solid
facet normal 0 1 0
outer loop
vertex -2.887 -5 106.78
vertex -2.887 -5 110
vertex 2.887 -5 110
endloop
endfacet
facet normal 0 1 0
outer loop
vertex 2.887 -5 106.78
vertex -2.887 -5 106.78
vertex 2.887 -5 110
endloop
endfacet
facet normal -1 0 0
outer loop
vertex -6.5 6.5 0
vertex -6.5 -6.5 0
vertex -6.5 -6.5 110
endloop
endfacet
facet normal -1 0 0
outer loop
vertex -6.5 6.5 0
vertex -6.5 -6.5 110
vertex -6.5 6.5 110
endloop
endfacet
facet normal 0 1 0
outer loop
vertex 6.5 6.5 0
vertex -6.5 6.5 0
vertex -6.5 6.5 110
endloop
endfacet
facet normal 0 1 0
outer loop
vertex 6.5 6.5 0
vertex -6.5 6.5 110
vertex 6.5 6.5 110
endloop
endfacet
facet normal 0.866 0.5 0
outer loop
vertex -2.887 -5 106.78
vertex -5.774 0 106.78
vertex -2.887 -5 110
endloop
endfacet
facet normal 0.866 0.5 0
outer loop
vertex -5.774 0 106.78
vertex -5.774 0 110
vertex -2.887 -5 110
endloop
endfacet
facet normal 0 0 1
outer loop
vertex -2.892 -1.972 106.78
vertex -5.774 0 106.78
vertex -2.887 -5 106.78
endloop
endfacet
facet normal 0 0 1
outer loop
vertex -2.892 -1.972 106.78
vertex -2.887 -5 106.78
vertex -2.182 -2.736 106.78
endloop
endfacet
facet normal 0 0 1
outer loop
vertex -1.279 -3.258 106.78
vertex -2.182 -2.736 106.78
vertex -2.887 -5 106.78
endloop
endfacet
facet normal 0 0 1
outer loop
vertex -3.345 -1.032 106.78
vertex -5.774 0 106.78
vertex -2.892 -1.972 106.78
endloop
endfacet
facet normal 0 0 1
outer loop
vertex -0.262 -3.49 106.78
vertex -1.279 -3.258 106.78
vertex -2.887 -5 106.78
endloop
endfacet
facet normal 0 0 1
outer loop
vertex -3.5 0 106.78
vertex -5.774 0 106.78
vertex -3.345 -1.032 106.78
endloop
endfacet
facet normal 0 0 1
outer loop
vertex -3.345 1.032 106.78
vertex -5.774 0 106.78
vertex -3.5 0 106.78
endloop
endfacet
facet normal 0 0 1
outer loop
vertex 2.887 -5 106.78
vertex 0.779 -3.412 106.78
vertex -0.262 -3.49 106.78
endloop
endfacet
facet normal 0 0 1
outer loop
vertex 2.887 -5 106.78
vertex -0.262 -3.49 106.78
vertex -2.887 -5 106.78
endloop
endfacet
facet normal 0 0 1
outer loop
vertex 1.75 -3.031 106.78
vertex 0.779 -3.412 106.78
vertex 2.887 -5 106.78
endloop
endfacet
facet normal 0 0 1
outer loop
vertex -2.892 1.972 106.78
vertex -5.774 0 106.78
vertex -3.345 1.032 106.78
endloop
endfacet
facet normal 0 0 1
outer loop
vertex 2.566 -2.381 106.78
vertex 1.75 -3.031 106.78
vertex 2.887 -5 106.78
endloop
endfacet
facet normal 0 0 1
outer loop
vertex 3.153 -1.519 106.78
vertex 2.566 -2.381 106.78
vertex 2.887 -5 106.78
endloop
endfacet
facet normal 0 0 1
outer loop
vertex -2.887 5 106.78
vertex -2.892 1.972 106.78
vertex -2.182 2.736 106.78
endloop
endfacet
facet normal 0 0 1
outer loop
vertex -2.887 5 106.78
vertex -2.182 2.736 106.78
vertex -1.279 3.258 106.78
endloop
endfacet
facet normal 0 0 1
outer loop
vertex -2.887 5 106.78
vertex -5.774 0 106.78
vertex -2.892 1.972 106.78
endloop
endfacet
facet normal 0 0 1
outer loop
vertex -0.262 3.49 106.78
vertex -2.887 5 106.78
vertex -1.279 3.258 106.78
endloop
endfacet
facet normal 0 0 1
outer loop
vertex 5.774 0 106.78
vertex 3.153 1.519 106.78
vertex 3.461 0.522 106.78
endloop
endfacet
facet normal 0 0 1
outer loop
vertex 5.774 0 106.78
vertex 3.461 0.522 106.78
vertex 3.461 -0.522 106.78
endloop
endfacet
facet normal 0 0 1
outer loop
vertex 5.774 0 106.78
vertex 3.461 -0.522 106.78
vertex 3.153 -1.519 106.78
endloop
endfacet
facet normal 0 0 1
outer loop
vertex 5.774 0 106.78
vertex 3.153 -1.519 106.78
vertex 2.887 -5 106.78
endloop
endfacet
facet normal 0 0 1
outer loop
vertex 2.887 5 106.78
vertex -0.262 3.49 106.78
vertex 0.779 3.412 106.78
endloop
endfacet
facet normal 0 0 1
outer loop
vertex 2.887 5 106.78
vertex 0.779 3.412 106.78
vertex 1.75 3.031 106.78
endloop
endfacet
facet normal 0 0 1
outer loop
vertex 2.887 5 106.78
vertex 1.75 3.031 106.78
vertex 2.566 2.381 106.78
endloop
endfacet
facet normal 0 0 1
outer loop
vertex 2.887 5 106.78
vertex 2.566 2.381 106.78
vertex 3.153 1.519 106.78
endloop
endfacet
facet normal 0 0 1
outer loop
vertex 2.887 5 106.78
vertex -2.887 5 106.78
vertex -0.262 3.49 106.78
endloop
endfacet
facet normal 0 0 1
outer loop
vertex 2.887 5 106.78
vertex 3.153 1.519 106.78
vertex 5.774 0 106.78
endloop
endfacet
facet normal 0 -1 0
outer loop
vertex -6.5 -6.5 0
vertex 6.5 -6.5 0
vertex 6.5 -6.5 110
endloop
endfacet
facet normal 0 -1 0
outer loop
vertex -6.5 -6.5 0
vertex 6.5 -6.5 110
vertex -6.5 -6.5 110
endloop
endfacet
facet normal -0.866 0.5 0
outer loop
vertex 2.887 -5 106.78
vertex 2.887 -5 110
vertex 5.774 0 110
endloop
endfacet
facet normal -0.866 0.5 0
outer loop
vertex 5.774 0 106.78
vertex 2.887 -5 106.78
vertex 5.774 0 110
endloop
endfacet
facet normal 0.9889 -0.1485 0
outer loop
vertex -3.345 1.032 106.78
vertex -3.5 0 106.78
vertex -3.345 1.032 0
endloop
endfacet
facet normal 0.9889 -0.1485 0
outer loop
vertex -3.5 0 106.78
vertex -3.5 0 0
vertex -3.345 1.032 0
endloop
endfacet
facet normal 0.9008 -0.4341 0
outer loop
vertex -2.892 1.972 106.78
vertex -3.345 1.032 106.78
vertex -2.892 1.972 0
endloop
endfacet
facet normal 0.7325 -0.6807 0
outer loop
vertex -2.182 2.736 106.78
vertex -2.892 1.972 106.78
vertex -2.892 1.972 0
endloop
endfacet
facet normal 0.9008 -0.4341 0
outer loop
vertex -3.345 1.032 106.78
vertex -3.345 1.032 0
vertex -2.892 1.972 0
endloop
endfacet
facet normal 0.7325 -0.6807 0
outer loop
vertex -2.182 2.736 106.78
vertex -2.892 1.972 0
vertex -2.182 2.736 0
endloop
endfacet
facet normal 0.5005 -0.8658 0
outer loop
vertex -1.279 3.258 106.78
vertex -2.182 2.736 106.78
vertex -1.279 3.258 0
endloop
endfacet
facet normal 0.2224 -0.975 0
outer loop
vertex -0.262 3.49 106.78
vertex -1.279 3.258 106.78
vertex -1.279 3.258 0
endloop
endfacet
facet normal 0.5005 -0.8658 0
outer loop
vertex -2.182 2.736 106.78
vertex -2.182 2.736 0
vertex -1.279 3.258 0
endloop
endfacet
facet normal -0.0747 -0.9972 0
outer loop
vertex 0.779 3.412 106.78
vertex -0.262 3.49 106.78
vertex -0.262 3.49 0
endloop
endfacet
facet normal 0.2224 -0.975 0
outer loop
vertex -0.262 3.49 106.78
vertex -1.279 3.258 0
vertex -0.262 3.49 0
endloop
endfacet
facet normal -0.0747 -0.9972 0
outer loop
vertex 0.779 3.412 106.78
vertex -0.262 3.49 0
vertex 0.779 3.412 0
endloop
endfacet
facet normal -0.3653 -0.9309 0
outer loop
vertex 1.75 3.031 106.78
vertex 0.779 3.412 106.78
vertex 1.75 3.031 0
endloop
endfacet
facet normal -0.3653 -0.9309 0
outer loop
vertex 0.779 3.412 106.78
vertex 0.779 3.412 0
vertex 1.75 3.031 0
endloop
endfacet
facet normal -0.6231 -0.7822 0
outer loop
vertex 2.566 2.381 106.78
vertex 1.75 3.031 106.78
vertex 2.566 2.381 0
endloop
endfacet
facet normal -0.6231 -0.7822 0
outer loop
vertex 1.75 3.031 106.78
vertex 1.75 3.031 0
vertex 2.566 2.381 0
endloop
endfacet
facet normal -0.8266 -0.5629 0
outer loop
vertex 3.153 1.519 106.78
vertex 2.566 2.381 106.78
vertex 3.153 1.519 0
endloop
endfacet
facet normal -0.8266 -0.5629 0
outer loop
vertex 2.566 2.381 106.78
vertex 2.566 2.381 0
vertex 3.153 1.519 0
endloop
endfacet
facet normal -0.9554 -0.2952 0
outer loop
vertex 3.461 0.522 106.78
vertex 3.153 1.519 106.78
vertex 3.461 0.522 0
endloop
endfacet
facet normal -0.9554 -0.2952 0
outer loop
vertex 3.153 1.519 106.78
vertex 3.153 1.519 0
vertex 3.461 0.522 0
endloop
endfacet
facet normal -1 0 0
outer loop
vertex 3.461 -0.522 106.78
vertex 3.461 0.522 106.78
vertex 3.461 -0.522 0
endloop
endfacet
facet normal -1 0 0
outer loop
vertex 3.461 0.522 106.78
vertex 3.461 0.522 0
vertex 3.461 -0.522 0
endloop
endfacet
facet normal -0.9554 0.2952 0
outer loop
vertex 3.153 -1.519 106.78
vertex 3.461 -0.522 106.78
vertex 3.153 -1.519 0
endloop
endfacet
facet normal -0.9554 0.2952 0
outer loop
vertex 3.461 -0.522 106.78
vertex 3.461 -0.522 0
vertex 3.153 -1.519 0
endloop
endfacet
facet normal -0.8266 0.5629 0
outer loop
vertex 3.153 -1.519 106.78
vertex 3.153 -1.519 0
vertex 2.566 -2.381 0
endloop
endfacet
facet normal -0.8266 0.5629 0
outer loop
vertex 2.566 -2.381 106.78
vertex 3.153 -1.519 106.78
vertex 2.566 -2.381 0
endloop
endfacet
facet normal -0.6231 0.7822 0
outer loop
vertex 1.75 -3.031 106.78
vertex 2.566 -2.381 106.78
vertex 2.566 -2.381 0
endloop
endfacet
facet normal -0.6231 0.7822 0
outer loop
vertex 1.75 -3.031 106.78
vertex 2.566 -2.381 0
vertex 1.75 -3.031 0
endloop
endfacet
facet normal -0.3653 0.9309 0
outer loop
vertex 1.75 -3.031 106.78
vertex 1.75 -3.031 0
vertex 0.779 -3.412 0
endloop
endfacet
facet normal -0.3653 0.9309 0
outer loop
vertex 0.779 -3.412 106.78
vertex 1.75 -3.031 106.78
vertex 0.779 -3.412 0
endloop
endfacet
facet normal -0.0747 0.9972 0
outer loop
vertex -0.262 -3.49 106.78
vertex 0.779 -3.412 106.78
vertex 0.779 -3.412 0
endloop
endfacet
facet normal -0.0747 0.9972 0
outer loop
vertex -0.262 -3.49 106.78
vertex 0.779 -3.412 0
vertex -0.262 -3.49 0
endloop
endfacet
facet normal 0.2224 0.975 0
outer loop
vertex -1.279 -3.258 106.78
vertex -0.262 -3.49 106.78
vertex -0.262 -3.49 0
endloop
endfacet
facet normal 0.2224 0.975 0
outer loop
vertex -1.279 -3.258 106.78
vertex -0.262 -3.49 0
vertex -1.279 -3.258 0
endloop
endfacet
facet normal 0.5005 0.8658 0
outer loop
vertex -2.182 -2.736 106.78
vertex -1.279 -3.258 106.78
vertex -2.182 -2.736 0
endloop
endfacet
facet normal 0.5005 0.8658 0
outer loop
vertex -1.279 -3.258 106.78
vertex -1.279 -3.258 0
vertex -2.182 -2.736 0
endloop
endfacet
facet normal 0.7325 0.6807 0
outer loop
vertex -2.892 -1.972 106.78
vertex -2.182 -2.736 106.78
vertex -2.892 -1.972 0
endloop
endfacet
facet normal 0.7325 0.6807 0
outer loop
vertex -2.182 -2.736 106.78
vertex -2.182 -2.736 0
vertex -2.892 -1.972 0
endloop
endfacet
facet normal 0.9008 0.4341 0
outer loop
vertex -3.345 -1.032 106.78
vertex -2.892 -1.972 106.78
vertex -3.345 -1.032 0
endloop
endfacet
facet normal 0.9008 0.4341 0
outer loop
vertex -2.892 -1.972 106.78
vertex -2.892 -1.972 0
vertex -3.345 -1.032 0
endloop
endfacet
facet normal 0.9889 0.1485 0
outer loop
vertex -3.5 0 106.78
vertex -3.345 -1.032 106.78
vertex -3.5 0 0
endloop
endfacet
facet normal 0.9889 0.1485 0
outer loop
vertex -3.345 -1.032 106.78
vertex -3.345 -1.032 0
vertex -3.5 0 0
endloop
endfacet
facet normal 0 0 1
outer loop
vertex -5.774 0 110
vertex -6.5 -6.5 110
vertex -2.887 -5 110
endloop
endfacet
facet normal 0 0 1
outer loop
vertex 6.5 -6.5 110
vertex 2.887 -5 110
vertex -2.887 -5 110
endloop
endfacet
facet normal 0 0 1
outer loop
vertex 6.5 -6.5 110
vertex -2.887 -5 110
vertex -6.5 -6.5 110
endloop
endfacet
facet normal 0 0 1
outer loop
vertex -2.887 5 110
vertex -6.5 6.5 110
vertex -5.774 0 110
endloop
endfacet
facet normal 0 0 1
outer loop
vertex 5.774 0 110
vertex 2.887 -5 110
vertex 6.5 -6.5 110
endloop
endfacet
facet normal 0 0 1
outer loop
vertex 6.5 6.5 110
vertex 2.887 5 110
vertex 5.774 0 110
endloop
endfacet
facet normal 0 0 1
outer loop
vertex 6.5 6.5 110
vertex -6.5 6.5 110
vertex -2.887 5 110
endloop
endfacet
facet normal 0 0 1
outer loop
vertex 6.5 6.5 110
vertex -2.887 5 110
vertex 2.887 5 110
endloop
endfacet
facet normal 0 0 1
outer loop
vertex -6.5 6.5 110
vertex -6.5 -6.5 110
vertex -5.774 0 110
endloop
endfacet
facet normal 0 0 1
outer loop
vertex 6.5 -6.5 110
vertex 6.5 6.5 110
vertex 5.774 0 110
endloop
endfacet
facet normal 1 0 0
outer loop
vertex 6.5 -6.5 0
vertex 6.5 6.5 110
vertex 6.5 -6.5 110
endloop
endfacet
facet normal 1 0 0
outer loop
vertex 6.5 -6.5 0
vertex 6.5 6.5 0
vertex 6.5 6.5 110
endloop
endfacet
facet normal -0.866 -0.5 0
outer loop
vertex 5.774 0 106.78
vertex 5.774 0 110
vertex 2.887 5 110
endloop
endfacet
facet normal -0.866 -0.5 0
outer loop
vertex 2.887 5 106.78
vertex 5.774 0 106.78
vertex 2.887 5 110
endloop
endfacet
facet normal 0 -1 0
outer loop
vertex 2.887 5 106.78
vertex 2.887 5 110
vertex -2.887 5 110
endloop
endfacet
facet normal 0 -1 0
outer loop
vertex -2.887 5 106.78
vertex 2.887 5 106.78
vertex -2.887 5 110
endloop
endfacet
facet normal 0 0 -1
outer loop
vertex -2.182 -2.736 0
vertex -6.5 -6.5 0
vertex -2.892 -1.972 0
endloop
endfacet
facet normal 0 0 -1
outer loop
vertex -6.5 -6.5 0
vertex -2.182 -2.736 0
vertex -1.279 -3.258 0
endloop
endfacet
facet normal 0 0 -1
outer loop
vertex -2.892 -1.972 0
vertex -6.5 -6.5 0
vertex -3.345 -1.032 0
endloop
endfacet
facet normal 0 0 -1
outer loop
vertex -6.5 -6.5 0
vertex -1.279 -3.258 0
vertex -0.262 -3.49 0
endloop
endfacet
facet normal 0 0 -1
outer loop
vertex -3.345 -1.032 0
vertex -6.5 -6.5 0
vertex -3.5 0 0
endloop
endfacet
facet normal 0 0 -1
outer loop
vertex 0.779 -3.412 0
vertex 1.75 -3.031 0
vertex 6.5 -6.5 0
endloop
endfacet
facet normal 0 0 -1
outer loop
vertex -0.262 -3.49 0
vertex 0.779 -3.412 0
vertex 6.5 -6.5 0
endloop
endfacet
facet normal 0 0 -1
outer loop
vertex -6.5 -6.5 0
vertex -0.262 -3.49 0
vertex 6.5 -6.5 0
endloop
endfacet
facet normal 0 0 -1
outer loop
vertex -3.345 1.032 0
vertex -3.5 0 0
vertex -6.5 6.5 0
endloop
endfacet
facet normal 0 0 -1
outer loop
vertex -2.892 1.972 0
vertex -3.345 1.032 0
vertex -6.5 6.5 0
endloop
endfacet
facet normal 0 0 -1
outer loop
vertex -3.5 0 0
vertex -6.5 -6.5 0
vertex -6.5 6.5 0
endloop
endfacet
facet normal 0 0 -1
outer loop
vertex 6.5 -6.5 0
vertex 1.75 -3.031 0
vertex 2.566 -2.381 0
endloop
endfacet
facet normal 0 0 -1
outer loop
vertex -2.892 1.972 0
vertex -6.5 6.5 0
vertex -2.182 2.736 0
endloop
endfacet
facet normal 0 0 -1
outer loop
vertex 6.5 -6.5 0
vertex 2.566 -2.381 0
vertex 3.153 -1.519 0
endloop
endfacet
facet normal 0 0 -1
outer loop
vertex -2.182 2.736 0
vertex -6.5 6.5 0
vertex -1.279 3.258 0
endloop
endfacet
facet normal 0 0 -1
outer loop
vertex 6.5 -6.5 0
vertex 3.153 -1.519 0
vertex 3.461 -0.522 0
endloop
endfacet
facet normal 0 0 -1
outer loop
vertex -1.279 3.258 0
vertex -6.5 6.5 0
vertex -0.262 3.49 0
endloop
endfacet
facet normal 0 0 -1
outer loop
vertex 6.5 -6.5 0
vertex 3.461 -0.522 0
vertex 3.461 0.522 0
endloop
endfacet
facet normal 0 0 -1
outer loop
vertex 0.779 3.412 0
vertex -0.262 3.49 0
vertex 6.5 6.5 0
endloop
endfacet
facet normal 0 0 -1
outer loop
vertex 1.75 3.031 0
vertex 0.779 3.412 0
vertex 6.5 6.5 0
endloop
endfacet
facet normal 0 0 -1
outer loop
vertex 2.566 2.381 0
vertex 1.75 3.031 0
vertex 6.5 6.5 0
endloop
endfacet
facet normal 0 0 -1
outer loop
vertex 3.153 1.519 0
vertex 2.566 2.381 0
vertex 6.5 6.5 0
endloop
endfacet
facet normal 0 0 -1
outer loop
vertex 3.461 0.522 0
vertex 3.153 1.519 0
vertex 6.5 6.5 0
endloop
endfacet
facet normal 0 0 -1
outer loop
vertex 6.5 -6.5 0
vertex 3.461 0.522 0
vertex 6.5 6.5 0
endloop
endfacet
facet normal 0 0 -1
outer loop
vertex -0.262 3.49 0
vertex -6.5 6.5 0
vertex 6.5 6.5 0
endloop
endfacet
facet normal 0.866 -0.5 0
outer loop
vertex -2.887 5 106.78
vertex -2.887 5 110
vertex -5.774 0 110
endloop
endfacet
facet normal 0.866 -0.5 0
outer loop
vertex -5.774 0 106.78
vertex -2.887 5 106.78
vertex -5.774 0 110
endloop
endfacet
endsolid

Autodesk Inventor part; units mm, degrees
ref_plane "YZ Plane" through (0, 0, 0) normal (1, 0, 0) x (0, 1, 0)
ref_plane "XZ Plane" through (0, 0, 0) normal (0, 1, 0) x (-1, 0, 0)
ref_plane "XY Plane" through (0, 0, 0) normal (0, 0, 1) x (1, 0, 0)
sketch "Sketch1" plane through (0, 0, 0) normal (0, 0, 1) x (1, 0, 0)
  line L0 (5, -5) -> (5, 5) projected
  line L1 (-5, -5) -> (5, -5) projected
  line L2 (-5, 5) -> (-5, -5) projected
  line L3 (5, 5) -> (-5, 5) projected
  circle A0 centre (0, 0) radius 3
  line L4 (2.8868, -5) -> (5.7735, 0) projected
  line L5 (2.8868, -5) -> (5.7735, 0) projected
  line L6 (-2.8868, -5) -> (2.8868, -5) projected
  line L7 (-5.7735, 0) -> (-2.8868, -5) projected
  line L8 (-2.8868, 5) -> (-5.7735, 0) projected
  line L9 (2.8868, 5) -> (-2.8868, 5) projected
  line L10 (5.7735, 0) -> (2.8868, 5) projected
  circle A1 centre (0, 0) radius 2.9998 projected
  line L11 (6.5, -6.5) -> (-6.5, -6.5)
  line L12 (-6.5, -6.5) -> (-6.5, 6.5)
  line L13 (-6.5, 6.5) -> (6.5, 6.5)
  line L14 (6.5, 6.5) -> (6.5, -6.5)
  line L15 (6.5, -6.5) -> (-6.5, 6.5) construction
  line L16 (-6.5, -6.5) -> (6.5, 6.5) construction
  dimension "d0" = 6
  dimension "d7" = 13
  dimension "d8" = 13
extrude "Extrusion1" add sketch "Sketch1" along normal blind 110 contours L1 L4 L0 | L4 L1 L7 L2 L8 L3 L10 L0 | L0 L10 L4 | L10 L3 L0 | L1 L2 L7 | L7 L8 L2 | L8 L2 L3 | A0 | L11 L12 L13 L14
sketch "Sketch2" plane through (0, 0, 110) normal (0, 0, 1) x (1, 0, 0)
  point P0 (0, 0)
sketch "Sketch3" plane through (0, 0, 110) normal (0, 0, 1) x (1, 0, 0)
  circle A0 centre (0, 0) radius 4
  circle A1 centre (0, 0) radius 3
  line L0 (2.8868, -5) -> (5.7735, 0)
  line L1 (5.7735, 0) -> (2.8868, 5)
  line L2 (2.8868, 5) -> (-2.8868, 5)
  line L3 (-2.8868, 5) -> (-5.7735, 0)
  line L4 (-5.7735, 0) -> (-2.8868, -5)
  line L5 (-2.8868, -5) -> (2.8868, -5)
extrude "Extrusion2" cut sketch "Sketch3" against normal blind 3.22 contours A0 | A1 | L5 L4 L3 L2 L1 L0
sketch "Sketch4" plane through (0, 0, 0) normal (0, 0, -1) x (-1, 0, 0)
  circle A0 centre (0, 0) radius 3.5
  dimension "d9" = 7
extrude "Extrusion3" cut sketch "Sketch4" against normal through all
properties part number "plunger"
